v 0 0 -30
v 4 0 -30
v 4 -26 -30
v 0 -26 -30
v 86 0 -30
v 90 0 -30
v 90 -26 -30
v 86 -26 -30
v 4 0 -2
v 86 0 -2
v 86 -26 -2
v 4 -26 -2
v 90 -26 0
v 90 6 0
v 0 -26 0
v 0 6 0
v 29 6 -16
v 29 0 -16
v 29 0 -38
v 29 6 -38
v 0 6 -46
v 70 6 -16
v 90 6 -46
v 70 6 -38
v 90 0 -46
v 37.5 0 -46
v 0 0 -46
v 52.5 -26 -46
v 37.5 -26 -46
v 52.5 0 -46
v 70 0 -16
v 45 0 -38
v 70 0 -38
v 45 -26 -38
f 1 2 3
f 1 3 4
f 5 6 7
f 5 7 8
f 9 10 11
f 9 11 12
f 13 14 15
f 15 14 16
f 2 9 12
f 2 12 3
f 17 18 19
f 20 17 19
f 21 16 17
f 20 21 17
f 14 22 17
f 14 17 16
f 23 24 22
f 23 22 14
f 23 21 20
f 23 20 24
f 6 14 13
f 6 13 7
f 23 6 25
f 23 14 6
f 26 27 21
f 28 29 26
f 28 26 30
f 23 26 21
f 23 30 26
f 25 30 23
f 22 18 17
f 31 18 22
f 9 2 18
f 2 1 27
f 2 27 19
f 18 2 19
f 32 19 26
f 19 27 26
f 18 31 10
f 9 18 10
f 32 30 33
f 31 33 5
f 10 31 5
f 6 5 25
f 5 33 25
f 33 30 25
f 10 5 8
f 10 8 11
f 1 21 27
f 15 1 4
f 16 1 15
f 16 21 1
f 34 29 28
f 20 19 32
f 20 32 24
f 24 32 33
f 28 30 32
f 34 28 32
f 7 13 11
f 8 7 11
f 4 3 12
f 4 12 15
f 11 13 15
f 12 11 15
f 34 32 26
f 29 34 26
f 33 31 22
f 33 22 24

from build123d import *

# Parameters (mm, degrees)
SKETCH1_W           = 90
SKETCH1_H           = 46
SKETCH1_W_2         = 41
SKETCH1_H_2         = 22
BOSS_EXTRUDE1_DEPTH = 6
BOSS_EXTRUDE2_DEPTH = 26


with BuildPart() as part:
    # Sketch1 → Boss-Extrude1 (new body)
    with BuildSketch(Plane(origin=(0, 0, 0), x_dir=(1, 0, 0), z_dir=(0, 1, 0))):
        with Locations((45, 23)):
            Rectangle(SKETCH1_W, SKETCH1_H)
        with Locations((49.5, 27)):
            Rectangle(SKETCH1_W_2, SKETCH1_H_2, mode=Mode.SUBTRACT)
    extrude(amount=BOSS_EXTRUDE1_DEPTH)

    # Sketch2 → Boss-Extrude2 (add)
    with BuildSketch(Plane.XZ):
        Polygon((0, 0), (4, 0), (82, 0), (90, 0), (90, -30), (86, -30), (86, -2), (4, -2), (4, -30), (0, -30), align=None)
        Polygon((37.5, -46), (52.5, -46), (45, -38), align=None)
    extrude(amount=BOSS_EXTRUDE2_DEPTH)


solid = part.part
